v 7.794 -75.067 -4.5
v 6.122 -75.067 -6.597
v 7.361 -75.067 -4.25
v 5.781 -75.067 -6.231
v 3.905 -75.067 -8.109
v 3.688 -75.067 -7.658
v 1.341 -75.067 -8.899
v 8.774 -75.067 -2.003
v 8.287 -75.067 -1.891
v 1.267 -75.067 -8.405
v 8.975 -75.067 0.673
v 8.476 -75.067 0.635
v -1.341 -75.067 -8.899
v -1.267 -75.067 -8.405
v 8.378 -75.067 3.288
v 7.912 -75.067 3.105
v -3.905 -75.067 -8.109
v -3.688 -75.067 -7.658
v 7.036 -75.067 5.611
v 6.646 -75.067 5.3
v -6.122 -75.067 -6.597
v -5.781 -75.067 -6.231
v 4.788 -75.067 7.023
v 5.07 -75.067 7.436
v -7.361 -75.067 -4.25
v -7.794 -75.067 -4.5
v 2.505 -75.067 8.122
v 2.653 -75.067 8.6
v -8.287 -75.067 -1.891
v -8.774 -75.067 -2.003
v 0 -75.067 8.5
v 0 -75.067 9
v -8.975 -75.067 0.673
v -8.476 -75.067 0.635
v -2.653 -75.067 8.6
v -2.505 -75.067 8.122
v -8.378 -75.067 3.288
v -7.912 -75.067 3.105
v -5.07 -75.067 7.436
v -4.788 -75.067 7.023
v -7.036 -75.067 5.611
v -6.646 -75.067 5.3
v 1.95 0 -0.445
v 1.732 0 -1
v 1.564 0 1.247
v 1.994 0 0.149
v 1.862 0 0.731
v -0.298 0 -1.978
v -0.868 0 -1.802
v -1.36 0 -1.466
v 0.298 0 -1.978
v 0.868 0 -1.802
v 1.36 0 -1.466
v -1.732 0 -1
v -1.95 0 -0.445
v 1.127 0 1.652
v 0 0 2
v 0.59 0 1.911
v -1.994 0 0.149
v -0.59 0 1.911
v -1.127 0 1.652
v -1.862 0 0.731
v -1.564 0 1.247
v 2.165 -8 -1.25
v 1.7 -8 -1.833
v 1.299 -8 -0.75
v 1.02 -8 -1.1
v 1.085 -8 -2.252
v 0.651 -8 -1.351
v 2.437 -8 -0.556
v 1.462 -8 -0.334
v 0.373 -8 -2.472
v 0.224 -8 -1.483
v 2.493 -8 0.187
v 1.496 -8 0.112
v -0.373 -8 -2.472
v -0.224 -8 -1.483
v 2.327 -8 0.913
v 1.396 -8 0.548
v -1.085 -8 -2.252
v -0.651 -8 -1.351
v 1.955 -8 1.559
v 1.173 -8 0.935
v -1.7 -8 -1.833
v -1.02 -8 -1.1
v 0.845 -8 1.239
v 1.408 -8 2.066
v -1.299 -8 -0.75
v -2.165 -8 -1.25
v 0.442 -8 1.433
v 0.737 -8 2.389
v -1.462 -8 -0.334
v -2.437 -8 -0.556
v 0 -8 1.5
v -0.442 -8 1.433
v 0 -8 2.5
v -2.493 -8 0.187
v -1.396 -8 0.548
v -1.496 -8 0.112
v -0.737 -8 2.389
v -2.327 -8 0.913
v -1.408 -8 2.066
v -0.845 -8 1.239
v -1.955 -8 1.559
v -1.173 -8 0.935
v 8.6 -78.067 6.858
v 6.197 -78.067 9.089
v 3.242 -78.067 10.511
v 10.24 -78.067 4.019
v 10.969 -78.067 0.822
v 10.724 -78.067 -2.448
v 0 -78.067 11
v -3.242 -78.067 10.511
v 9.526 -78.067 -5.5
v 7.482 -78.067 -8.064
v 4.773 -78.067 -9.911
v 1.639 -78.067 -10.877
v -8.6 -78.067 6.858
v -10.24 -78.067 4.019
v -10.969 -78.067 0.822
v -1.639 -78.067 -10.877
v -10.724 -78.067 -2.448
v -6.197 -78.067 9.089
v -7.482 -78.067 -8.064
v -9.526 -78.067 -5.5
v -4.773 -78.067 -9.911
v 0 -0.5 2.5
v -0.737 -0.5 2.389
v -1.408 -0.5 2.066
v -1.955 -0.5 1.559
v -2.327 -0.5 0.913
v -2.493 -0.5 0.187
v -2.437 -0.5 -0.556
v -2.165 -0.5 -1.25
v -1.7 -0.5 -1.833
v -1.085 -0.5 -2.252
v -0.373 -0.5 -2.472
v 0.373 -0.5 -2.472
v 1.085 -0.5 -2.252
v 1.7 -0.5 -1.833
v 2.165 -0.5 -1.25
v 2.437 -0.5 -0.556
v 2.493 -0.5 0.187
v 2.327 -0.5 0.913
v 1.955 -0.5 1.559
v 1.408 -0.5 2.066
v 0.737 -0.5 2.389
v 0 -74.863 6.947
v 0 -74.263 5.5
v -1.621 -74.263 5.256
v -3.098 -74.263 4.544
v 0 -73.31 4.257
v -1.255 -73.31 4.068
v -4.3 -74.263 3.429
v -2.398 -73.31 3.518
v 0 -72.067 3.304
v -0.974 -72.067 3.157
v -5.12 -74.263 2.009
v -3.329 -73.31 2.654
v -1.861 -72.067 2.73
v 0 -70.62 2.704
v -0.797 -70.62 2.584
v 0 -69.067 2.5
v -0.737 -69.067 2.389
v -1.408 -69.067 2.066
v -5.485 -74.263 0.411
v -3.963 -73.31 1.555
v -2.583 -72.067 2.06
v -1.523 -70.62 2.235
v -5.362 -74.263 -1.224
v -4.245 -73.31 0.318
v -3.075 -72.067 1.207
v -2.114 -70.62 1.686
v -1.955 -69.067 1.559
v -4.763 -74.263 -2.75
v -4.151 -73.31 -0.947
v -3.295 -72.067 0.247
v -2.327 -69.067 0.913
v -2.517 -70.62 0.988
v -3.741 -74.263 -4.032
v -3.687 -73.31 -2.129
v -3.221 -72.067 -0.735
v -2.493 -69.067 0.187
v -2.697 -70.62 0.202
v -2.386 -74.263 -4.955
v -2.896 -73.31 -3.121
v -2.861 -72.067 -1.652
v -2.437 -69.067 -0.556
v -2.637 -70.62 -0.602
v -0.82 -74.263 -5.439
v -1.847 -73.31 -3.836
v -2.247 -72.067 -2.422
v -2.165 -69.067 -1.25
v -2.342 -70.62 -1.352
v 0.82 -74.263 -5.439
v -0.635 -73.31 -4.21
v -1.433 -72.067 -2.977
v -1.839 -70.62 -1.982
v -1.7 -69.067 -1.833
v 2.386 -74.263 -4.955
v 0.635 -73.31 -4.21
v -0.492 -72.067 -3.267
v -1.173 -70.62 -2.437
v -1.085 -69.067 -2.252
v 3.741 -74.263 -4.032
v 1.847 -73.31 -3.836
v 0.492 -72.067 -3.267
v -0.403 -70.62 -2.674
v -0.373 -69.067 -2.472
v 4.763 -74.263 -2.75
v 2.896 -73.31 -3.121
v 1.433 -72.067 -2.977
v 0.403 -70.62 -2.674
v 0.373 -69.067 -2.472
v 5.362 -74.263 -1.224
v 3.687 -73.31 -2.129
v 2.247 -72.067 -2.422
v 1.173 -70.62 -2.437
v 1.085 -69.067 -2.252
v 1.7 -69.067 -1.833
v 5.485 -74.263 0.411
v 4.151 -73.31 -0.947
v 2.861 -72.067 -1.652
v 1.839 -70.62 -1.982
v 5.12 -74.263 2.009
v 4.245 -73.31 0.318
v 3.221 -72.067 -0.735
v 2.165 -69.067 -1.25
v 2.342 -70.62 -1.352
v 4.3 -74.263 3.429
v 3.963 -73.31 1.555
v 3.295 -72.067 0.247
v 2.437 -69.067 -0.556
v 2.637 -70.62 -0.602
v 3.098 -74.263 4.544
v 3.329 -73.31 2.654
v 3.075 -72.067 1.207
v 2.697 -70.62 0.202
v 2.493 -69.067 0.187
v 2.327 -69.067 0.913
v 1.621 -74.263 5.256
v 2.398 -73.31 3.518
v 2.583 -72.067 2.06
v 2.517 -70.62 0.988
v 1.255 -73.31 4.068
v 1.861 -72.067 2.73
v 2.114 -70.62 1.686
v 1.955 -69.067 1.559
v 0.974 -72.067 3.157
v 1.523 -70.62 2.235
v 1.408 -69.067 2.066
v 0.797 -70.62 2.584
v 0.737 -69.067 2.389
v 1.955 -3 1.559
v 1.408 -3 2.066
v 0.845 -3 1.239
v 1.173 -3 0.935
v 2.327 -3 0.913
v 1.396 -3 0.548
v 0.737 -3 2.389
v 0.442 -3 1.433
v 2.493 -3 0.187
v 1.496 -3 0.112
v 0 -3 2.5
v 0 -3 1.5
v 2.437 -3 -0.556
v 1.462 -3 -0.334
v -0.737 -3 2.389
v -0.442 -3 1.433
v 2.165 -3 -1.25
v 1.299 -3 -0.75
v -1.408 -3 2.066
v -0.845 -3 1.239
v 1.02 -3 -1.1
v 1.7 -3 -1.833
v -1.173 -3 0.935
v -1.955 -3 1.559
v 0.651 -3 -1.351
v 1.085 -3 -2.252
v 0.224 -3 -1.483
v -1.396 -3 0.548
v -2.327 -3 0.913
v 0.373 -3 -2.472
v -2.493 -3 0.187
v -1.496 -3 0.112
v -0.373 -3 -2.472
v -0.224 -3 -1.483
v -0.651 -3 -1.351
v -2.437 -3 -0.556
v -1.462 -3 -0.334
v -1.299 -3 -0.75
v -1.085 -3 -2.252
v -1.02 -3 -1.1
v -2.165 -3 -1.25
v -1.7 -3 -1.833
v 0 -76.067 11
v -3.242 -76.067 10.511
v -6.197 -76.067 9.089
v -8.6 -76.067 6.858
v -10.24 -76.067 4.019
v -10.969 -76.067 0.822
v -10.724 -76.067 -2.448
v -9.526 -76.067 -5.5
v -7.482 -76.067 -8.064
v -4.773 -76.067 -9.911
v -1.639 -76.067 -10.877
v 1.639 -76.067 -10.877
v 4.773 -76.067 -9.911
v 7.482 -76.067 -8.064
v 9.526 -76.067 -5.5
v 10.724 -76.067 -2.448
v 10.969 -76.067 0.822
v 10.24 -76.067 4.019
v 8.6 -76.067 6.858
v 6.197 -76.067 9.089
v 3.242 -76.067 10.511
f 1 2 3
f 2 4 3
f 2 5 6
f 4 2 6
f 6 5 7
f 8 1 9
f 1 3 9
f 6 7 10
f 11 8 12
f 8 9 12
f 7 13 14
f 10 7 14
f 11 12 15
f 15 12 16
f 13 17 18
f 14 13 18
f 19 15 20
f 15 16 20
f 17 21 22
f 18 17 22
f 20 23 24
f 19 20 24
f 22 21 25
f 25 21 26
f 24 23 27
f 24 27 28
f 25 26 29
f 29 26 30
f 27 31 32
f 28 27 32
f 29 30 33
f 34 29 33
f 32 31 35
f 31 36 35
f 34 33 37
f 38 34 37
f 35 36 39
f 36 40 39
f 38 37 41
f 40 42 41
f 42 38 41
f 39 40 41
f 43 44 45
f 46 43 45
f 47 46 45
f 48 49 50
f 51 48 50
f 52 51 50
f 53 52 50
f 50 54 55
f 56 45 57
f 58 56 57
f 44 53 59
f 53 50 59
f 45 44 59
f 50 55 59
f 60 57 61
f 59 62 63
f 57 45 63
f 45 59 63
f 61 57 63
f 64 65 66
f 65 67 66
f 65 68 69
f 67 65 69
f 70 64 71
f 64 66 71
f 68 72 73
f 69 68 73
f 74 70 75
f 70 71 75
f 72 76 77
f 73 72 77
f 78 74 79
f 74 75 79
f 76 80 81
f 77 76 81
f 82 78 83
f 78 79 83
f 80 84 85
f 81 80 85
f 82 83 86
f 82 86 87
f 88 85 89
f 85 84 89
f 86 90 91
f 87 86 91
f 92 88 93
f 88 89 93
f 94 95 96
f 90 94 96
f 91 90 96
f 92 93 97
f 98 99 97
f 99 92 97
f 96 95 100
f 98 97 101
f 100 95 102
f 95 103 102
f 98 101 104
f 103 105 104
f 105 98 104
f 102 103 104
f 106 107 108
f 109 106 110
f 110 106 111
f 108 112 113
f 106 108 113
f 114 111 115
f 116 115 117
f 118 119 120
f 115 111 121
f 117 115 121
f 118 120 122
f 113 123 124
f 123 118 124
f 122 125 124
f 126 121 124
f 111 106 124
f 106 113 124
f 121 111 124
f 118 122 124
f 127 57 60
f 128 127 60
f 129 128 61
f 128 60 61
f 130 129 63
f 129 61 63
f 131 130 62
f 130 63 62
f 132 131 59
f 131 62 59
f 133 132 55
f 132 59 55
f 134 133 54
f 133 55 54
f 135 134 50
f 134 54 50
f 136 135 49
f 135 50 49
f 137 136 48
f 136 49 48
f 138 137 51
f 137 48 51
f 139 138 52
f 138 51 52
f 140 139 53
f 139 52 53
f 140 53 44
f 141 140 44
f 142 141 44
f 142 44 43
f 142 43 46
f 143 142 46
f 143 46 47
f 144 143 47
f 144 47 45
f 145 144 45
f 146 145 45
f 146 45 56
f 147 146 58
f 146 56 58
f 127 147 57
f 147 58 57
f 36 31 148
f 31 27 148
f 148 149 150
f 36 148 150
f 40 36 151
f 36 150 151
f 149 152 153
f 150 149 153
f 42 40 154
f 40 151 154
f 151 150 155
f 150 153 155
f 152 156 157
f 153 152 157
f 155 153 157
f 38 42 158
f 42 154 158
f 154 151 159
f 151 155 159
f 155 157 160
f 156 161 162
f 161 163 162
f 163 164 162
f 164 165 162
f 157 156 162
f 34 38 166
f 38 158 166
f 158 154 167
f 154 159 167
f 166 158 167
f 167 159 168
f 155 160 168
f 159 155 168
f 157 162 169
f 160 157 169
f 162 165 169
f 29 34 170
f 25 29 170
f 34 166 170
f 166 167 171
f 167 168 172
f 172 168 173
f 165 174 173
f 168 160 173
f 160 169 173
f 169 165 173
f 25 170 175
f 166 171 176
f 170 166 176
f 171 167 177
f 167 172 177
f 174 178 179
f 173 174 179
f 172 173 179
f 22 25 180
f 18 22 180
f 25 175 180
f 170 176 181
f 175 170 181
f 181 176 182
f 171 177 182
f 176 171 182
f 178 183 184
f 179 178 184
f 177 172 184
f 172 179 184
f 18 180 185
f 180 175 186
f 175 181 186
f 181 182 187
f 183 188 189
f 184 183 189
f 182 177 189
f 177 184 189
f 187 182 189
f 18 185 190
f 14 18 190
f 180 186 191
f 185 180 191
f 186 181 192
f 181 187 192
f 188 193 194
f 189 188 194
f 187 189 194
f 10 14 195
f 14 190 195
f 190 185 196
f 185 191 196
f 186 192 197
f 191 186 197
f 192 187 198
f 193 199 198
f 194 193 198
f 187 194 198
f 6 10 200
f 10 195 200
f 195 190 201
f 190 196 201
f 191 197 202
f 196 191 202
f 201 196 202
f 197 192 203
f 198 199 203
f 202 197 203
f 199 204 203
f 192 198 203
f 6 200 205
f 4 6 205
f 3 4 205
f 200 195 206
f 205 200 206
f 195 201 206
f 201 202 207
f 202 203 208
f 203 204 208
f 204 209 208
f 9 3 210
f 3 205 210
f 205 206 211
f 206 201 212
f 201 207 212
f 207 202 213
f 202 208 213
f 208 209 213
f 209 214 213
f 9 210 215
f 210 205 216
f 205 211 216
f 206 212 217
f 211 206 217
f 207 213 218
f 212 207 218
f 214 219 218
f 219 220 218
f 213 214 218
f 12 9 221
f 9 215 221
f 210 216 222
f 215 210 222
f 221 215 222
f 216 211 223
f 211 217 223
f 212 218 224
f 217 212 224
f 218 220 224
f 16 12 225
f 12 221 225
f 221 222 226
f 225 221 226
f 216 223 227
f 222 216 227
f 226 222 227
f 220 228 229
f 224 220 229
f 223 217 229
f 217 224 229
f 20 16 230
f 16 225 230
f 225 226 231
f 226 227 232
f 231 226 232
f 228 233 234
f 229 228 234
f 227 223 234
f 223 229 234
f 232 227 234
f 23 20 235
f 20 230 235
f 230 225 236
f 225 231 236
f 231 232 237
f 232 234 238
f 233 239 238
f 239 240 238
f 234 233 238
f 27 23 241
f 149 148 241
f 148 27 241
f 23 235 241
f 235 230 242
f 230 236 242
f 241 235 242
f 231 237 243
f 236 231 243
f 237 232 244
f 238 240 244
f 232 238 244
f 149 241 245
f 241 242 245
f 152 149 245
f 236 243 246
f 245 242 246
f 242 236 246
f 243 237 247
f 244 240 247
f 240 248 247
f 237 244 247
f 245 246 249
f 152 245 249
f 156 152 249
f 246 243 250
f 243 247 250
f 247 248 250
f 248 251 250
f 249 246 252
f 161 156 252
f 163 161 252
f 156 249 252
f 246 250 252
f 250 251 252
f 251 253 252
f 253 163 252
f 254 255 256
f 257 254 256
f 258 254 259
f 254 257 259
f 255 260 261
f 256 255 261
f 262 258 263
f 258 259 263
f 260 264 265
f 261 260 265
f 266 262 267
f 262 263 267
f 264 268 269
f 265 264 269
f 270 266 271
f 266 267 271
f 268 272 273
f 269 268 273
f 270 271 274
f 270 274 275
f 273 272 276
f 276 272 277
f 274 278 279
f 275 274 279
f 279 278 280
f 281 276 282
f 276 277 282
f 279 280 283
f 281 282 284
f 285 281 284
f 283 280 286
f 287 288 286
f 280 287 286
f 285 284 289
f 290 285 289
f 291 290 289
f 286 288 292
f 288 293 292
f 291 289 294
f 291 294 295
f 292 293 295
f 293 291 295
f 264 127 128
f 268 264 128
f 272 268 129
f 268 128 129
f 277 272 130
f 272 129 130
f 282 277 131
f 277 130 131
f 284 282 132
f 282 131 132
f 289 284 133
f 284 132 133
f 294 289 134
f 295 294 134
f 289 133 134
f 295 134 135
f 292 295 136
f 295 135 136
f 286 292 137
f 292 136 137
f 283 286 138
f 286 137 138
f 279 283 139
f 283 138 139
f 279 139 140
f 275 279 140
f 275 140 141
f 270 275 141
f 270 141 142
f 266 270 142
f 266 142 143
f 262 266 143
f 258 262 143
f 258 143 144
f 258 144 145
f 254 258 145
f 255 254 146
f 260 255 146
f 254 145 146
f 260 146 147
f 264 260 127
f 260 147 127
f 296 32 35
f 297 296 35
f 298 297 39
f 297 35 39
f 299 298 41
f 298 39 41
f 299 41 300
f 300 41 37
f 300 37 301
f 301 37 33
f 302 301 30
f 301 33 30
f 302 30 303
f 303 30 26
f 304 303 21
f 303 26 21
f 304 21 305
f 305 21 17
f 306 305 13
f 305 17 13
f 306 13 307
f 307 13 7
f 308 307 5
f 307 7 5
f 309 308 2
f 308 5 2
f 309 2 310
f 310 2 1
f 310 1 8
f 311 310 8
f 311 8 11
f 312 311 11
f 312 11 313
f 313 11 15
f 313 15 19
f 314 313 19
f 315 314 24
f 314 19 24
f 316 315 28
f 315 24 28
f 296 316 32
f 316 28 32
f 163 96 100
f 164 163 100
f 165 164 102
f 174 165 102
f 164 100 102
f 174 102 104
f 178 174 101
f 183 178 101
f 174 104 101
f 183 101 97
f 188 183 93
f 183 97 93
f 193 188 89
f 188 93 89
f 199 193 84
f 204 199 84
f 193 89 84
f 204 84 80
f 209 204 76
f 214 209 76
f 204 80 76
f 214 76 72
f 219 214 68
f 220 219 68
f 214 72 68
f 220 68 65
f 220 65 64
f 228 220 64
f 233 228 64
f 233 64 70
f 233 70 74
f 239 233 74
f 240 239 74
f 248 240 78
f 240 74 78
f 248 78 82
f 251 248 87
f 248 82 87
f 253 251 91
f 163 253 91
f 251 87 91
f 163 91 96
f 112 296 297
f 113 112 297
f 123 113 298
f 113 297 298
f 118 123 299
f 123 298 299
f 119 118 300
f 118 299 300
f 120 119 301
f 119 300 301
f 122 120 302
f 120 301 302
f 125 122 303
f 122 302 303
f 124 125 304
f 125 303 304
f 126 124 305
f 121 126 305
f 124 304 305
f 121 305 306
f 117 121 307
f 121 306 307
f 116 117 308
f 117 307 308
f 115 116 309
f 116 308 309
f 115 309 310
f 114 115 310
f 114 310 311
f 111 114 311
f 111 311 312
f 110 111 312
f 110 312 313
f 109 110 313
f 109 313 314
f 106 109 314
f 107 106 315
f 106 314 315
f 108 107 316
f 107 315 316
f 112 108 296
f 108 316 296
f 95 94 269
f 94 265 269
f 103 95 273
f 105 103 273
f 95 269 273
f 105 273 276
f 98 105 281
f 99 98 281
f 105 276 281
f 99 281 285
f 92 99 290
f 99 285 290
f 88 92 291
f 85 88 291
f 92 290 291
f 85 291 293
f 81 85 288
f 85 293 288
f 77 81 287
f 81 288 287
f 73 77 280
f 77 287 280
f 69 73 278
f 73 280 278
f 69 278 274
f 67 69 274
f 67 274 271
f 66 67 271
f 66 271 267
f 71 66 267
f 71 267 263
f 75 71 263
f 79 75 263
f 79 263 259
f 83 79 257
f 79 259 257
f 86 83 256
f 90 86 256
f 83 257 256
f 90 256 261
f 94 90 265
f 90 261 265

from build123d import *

# Parameters (mm, degrees)
FILLET1_R      = 6
CHAMFER1_SIZE  = 1
CHAMFER1_SIZE2 = 2
CHAMFER2_SIZE  = 0.5


with BuildPart() as part:
    # Sketch1 → Revolve1 (revolve)
    with BuildSketch(Plane(origin=(0, 0, 0), x_dir=(0, 0, -1), z_dir=(1, 0, 0)), mode=Mode.PRIVATE) as revolve1_sk:
        Polygon((0, 0), (0, -78.067128988), (11, -78.067128988), (11, -75.067128988), (2.5, -75.067128988), (2.5, -8), (1.5, -8), (1.5, -3), (2.5, -3), (2.5, 0), align=None)
    revolve(revolve1_sk.sketch.rotate(Axis((0, 0, 0), (0, -1, 0)), 180), axis=Axis((0, 0, 0), (0, -1, 0)))

    # Fillet1
    fillet1_edges = [part.edges().sort_by_distance(p)[0] for p in [
        (0, -75.067128988, -2.5),
    ]]
    fillet(fillet1_edges, radius=FILLET1_R)

    # Chamfer1
    chamfer1_edges = [part.edges().sort_by_distance(p)[0] for p in [
        (0, -75.067128988, -11),
    ]]
    chamfer1_side = [part.faces().sort_by_distance(p)[0] for p in [
        (0, -76.567128988, -11),
    ]]
    chamfer(chamfer1_edges, length=CHAMFER1_SIZE, length2=CHAMFER1_SIZE2, reference=chamfer1_side[0])

    # Chamfer2
    chamfer2_edges = [part.edges().sort_by_distance(p)[0] for p in [
        (0, 0, -2.5),
    ]]
    chamfer(chamfer2_edges, length=CHAMFER2_SIZE)


solid = part.part
